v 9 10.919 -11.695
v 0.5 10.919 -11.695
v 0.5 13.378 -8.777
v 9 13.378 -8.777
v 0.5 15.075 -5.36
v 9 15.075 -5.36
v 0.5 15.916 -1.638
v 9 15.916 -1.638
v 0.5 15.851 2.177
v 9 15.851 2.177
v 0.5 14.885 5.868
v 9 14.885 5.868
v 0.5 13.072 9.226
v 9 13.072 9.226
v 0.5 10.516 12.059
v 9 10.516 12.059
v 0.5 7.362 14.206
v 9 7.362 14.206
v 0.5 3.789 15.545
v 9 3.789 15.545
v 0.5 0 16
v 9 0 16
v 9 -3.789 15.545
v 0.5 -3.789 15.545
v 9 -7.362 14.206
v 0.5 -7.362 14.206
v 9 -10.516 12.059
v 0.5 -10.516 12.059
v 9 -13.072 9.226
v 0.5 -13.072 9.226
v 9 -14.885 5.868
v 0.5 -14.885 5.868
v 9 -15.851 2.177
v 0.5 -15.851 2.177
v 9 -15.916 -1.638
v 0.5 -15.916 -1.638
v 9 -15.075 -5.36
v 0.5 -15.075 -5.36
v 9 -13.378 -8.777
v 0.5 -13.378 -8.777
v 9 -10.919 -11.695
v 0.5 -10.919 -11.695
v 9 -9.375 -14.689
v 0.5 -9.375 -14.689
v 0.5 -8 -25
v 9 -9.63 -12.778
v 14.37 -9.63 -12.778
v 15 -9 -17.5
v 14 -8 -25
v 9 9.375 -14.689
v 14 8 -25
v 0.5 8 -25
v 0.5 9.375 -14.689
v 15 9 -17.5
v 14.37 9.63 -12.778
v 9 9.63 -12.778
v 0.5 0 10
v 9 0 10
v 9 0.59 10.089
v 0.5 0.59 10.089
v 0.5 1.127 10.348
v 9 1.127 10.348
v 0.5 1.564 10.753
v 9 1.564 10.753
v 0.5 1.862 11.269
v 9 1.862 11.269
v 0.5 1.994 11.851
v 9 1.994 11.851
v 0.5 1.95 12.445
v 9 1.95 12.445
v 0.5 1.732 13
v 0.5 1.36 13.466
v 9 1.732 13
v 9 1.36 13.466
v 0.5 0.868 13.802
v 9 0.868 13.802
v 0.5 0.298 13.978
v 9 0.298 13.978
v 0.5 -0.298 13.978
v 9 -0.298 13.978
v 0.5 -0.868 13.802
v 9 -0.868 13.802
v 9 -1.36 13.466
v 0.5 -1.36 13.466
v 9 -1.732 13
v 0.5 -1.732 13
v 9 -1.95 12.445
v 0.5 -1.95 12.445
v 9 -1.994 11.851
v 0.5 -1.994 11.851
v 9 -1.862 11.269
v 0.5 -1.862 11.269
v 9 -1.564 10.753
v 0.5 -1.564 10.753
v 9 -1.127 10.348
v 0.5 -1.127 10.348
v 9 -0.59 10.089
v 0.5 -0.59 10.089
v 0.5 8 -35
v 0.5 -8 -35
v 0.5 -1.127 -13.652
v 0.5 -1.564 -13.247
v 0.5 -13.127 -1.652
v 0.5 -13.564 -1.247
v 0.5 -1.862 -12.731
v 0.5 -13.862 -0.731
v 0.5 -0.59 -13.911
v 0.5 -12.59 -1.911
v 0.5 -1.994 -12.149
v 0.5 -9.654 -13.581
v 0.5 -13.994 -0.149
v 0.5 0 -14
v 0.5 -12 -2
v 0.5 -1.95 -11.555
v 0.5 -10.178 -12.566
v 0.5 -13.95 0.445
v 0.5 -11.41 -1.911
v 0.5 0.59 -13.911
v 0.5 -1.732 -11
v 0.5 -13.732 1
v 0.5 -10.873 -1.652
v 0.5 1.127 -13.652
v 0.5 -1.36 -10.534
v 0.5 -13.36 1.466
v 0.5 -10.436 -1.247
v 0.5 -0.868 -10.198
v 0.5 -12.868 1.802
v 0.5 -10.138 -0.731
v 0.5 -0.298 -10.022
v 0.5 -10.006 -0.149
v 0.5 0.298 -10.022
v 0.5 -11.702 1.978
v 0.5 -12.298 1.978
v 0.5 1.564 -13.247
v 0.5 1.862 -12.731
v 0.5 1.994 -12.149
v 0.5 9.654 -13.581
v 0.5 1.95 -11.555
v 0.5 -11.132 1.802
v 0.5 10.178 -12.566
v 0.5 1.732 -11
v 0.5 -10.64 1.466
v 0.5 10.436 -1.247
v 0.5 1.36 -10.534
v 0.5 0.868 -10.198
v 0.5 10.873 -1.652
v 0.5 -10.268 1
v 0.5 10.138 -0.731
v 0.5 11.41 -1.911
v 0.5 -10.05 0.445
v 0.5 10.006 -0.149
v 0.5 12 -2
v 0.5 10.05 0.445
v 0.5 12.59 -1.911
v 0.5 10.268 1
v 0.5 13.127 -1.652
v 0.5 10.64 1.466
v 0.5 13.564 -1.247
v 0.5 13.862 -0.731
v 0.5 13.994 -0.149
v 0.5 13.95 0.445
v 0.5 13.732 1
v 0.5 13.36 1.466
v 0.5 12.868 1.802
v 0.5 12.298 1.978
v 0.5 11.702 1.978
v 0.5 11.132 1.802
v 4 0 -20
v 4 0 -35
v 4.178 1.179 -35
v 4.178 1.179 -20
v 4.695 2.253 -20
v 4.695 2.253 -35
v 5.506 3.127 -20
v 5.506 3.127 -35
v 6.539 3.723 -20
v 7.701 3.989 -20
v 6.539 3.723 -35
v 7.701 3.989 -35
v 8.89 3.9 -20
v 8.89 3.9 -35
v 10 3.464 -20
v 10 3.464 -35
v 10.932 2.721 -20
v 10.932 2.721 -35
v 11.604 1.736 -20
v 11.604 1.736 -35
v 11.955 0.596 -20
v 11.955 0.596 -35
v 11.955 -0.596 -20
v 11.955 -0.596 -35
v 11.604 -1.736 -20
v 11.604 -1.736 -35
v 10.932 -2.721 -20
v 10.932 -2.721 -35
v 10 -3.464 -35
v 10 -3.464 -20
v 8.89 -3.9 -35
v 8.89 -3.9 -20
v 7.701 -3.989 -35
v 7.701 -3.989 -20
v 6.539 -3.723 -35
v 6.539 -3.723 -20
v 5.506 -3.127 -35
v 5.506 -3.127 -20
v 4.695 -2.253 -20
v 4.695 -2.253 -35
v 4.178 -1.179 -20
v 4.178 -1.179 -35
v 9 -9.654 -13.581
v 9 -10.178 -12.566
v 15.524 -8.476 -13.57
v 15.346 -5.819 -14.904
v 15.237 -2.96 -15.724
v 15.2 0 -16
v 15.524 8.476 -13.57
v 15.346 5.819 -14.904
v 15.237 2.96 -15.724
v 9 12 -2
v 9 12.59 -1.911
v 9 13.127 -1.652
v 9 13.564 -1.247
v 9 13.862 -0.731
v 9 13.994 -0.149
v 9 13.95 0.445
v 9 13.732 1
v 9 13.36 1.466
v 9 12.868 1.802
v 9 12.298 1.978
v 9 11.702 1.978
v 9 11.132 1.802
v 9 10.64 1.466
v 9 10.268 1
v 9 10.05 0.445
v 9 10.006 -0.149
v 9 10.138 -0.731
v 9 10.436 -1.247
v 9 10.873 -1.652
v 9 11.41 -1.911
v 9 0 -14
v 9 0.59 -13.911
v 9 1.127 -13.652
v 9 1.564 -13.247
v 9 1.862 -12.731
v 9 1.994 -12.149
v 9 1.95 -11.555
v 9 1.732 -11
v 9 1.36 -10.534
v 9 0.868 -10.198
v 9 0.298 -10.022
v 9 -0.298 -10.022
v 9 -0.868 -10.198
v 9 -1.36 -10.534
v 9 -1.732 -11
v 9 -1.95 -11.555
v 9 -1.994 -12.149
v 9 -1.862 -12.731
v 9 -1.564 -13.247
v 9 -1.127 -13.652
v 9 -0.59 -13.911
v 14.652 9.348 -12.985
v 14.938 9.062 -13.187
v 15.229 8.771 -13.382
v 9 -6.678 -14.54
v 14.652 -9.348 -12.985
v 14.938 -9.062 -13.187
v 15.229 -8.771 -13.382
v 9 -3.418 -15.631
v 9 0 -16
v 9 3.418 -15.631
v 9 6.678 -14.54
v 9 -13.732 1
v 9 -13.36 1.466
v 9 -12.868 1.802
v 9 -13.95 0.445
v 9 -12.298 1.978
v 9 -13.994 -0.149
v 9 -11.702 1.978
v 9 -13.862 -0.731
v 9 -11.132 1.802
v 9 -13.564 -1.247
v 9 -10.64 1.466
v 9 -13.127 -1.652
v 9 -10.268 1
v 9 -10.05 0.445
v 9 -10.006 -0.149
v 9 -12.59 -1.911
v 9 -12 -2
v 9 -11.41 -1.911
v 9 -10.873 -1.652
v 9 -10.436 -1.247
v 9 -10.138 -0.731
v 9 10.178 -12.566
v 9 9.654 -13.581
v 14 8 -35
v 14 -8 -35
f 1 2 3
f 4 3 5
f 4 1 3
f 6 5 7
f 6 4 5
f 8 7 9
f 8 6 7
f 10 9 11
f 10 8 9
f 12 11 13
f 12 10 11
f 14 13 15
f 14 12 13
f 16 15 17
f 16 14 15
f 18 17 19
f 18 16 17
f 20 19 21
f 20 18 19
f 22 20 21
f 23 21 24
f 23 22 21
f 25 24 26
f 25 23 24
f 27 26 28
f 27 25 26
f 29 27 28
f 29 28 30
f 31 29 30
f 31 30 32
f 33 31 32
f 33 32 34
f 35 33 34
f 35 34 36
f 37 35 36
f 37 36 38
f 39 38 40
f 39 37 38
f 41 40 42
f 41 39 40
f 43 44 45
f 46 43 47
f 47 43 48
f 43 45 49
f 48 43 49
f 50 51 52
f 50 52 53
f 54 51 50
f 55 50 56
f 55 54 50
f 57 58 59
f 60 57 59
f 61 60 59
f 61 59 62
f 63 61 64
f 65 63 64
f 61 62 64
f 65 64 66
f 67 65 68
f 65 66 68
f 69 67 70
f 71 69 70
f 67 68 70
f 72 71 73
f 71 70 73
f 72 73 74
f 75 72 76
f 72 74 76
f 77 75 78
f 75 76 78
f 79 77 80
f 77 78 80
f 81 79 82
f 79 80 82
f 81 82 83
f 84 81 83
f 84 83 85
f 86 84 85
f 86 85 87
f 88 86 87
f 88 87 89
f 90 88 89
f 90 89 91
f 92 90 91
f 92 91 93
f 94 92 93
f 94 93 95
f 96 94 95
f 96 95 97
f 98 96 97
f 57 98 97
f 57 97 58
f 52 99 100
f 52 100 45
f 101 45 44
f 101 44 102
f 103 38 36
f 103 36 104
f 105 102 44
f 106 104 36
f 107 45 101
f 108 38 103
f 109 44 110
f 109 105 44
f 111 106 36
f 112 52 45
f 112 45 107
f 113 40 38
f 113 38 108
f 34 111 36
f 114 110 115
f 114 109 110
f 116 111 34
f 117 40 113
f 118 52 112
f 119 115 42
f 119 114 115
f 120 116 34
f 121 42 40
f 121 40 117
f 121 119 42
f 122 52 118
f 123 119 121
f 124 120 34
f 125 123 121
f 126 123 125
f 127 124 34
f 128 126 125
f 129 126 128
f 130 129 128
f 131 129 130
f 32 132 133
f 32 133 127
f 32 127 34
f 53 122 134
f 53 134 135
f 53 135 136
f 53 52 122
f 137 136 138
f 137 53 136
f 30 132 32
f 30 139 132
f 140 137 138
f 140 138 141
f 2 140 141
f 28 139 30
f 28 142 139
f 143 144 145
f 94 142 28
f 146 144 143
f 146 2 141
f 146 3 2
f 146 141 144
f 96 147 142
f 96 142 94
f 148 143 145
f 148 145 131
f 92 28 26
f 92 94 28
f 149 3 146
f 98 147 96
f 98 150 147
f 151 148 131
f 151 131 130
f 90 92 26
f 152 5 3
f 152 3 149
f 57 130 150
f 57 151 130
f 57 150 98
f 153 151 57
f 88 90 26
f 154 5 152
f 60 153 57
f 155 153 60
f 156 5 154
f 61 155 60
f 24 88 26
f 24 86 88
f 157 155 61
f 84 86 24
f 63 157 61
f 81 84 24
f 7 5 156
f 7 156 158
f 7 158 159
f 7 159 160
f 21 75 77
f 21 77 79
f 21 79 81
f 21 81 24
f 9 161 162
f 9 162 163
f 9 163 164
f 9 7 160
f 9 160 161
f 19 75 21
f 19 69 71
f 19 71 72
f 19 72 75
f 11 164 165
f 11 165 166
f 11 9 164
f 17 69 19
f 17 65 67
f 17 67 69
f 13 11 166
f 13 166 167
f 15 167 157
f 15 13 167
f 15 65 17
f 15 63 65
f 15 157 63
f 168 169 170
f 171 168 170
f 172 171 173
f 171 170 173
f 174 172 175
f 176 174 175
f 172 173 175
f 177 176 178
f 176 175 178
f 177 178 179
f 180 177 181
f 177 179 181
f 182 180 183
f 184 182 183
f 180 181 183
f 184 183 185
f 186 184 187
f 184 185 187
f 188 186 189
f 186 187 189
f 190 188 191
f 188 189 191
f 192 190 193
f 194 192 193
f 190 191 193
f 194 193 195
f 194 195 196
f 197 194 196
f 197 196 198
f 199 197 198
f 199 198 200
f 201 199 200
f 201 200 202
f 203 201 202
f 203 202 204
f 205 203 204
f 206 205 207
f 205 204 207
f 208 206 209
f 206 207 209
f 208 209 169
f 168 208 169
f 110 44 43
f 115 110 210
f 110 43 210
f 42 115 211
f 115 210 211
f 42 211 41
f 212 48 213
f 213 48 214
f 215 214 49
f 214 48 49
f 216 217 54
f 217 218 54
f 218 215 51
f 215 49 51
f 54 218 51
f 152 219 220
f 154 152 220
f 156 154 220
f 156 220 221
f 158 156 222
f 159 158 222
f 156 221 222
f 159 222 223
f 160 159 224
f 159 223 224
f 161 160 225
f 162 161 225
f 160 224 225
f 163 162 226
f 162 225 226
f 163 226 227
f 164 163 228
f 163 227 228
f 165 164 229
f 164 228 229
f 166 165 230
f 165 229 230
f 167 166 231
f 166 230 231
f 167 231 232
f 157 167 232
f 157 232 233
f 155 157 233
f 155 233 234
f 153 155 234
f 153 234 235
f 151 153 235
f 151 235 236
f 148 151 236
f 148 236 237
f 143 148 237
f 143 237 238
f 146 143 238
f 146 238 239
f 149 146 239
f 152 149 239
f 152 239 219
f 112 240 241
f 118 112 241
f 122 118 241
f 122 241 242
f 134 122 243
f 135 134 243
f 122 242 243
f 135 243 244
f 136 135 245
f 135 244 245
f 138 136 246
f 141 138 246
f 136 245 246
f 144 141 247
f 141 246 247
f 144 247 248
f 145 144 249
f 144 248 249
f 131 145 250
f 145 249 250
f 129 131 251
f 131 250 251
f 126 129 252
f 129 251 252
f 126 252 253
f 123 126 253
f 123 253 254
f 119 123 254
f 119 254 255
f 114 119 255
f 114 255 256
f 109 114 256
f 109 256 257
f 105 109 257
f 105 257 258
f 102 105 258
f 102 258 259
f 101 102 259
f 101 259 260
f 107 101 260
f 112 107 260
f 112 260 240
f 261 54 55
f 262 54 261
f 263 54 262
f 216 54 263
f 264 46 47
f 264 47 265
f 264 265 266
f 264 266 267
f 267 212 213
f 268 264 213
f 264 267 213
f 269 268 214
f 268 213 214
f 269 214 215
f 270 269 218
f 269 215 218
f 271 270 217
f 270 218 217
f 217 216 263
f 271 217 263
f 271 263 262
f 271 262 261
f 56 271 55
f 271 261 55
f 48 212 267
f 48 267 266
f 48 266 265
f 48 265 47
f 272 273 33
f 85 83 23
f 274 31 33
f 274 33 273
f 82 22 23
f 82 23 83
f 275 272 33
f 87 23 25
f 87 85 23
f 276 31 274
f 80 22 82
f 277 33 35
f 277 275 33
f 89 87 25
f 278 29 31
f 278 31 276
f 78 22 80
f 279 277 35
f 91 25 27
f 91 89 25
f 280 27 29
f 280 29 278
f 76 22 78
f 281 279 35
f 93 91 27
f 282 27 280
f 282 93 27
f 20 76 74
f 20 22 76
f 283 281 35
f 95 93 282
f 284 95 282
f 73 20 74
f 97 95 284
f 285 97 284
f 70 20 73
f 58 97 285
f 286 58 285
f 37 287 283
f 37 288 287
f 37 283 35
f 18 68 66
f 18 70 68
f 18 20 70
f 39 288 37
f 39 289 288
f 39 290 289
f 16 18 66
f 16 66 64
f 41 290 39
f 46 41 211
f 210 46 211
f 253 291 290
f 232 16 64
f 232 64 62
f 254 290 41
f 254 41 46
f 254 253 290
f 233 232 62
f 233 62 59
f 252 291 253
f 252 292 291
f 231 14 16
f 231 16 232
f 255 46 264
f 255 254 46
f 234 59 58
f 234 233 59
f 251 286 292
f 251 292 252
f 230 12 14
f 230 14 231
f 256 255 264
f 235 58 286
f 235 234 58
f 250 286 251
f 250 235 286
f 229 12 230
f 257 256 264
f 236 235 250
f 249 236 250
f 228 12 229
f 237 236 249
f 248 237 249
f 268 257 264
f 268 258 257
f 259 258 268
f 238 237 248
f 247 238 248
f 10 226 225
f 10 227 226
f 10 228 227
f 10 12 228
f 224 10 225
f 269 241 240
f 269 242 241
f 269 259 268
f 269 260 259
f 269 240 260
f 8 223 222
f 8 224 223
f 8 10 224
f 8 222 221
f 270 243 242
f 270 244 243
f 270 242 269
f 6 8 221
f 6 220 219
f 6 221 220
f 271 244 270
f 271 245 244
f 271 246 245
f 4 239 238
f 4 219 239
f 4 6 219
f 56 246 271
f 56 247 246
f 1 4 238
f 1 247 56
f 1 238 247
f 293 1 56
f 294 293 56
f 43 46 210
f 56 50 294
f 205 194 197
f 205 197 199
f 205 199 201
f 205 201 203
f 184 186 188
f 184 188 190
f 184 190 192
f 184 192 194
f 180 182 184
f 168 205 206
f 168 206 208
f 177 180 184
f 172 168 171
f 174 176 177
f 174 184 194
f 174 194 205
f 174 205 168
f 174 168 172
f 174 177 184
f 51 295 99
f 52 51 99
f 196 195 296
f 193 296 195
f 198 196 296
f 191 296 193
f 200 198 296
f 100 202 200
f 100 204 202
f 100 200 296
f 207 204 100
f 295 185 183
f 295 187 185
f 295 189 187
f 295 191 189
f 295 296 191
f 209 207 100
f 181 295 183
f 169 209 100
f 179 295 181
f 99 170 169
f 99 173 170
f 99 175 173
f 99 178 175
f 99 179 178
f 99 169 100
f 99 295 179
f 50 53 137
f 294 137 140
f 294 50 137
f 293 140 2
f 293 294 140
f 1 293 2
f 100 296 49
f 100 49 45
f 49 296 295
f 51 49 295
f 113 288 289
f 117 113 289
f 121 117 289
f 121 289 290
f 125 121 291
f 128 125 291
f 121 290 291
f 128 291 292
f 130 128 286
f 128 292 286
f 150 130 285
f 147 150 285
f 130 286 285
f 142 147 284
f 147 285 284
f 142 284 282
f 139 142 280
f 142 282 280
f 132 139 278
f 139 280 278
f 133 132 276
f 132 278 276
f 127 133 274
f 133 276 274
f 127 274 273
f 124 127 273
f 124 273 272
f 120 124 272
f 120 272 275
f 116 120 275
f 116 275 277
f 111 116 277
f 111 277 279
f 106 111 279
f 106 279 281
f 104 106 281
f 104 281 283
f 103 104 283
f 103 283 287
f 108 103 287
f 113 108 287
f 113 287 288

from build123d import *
from OCP.BRepFilletAPI import BRepFilletAPI_MakeChamfer

# Parameters (mm, degrees)
BOSS_EXTRUDE1_DEPTH = 16
CHAMFER1_SIZE       = 15
CHAMFER1_SIZE2      = 2
SKETCH2_R           = 3
CUT_EXTRUDE1_DEPTH  = 15
CHAMFER2_SIZE       = 2
THREAD1_PITCH       = 1.5
SKETCH5_R           = 7
BOSS_EXTRUDE2_DEPTH = 16
BOSS_EXTRUDE3_START = 10
SKETCH10_W          = 14
SKETCH10_H          = 16
SKETCH10_R          = 3
BOSS_EXTRUDE3_DEPTH = 10
BOSS_EXTRUDE4_START = 10
SKETCH11_R          = 3
BOSS_EXTRUDE4_DEPTH = 10
SKETCH12_R          = 16
CUT_EXTRUDE2_DEPTH  = 7
SKETCH13_R          = 16
BOSS_EXTRUDE5_DEPTH = 9
BOSS_EXTRUDE6_START = -9
BOSS_EXTRUDE6_DEPTH = 9
SKETCH15_R          = 2
CUT_EXTRUDE3_DEPTH  = 20
FILLET1_R           = 5
FILLET2_R           = 5
CUT_EXTRUDE4_START  = -0.5
CUT_EXTRUDE4_DEPTH  = 0.5
SKETCH17_R          = 4
CUT_EXTRUDE5_DEPTH  = 15


with BuildPart() as part:
    # Sketch1 → Boss-Extrude1 (new body)
    with BuildSketch(Plane(origin=(0, 0, 0), x_dir=(0, -1, 0), z_dir=(1, 0, 0))):
        with BuildLine():
            ThreePointArc((-10, 0), (0, 10), (10, 0))
            Line((10, 0), (10, 25))
            Line((10, 25), (-10, 25))
            Line((-10, 25), (-10, 0))
        make_face()
        with BuildLine():
            ThreePointArc((-4.5, 0), (0, 4.5), (4.5, 0))
            Line((4.5, 0), (10, 0))
            ThreePointArc((10, 0), (0, 10), (-10, 0))
            Line((-10, 0), (-4.5, 0))
        make_face()
        with BuildLine():
            Line((10, 0), (4.5, 0))
            ThreePointArc((4.5, 0), (0, -4.5), (-4.5, 0))
            Line((-4.5, 0), (-10, 0))
            ThreePointArc((-10, 0), (0, -10), (10, 0))
        make_face()
    extrude(amount=BOSS_EXTRUDE1_DEPTH)

    # Chamfer1: one chamfer whose edges measure the first distance from different faces: ONE call of the kernel's chamfer builder (chamfer() names one face for all edges)
    chamfer1_edges_1 = [part.edges().sort_by_distance(p)[0] for p in [
        (8, 10, -25),
    ]]
    chamfer1_side_1 = [part.faces().sort_by_distance(p)[0] for p in [
        (8, 10, -12.5),
    ]]
    chamfer1_edges_2 = [part.edges().sort_by_distance(p)[0] for p in [
        (8, -10, -25),
    ]]
    chamfer1_side_2 = [part.faces().sort_by_distance(p)[0] for p in [
        (8, -10, -12.5),
    ]]
    chamfer1_edges_3 = [part.edges().sort_by_distance(p)[0] for p in [
        (16, 0, -25),
    ]]
    chamfer1_side_3 = [part.faces().sort_by_distance(p)[0] for p in [
        (16, 0, -9.408066135),
    ]]
    chamfer1 = BRepFilletAPI_MakeChamfer(part.part.solid().wrapped)
    for e in chamfer1_edges_1:
        chamfer1.Add(CHAMFER1_SIZE, CHAMFER1_SIZE2, e.wrapped, chamfer1_side_1[0].wrapped)  # the first distance lies on this face
    for e in chamfer1_edges_2:
        chamfer1.Add(CHAMFER1_SIZE, CHAMFER1_SIZE2, e.wrapped, chamfer1_side_2[0].wrapped)  # the first distance lies on this face
    for e in chamfer1_edges_3:
        chamfer1.Add(CHAMFER1_SIZE, CHAMFER1_SIZE2, e.wrapped, chamfer1_side_3[0].wrapped)  # the first distance lies on this face
    add(Compound.cast(chamfer1.Shape()), mode=Mode.REPLACE)

    # Sketch2 → Cut-Extrude1 (cut)
    with BuildSketch(Plane(origin=(0, 0, -25), x_dir=(-1, 0, 0), z_dir=(0, 0, -1))):
        with Locations((-8, 0)):
            Circle(SKETCH2_R)
    extrude(amount=-CUT_EXTRUDE1_DEPTH, mode=Mode.SUBTRACT)

    # Chamfer2
    chamfer2_edges = [part.edges().sort_by_distance(p)[0] for p in [
        (0, 0, 10),
        (16, 0, 10),
        (16, 10, -5),
        (0, 10, -5),
        (0, -10, -5),
        (16, -10, -5),
    ]]
    chamfer(chamfer2_edges, length=CHAMFER2_SIZE)

    # Thread1: the profile of Thread Profile1 profile screwed along a right-hand helix of 11.333333 turns, 8 arcs to a turn; built about Z, then put on its axis
    thread1_z = Axis((0, 0, 0), (0, 0, 1))
    thread1_corners = [(4.4997, 0, -0.000173205), (5.311898812, 0, 0.468749998), (5.311898812, 0, 0.656249998), (4.4997, 0, 1.125173201)]
    with BuildLine(mode=Mode.PRIVATE) as thread1_profile:
        Line(thread1_corners[0], thread1_corners[1])
        Line(thread1_corners[1], thread1_corners[2])
        Line(thread1_corners[2], thread1_corners[3])
        Line(thread1_corners[3], thread1_corners[0])
    thread1_cap = Face(thread1_profile.wire())
    thread1_turn_angles = [0, 22.5, 45, 67.5, 90, 112.5, 135, 157.5, 180, 202.5, 225, 247.5, 270, 292.5, 315, 337.5, 360]
    thread1_turn_weights = [1, 0.9238795325112867, 1, 0.9238795325112867, 1, 0.9238795325112867, 1, 0.9238795325112867, 1, 0.9238795325112867, 1, 0.9238795325112867, 1, 0.9238795325112867, 1, 0.9238795325112867, 1]
    thread1_turn_rails = [Edge.make_bspline([Vector(p[0], p[1], 0).rotate(thread1_z, thread1_turn_angles[k]) / thread1_turn_weights[k] + Vector(0, 0, p[2] + THREAD1_PITCH * thread1_turn_angles[k] / 360) for k in range(17)], [0, 0, 0, 1, 1, 2, 2, 3, 3, 4, 4, 5, 5, 6, 6, 7, 7, 8, 8, 8], 2, thread1_turn_weights) for p in thread1_corners]
    thread1_turn_sides = [Face.make_surface_from_curves(thread1_turn_rails[p[0]], thread1_turn_rails[p[1]]) for p in [(0, 1), (1, 2), (2, 3), (3, 0)]]
    thread1_last_angles = [3960, 3982.5, 4005, 4027.5, 4050, 4065, 4080]
    thread1_last_weights = [1, 0.9238795325112867, 1, 0.9238795325112867, 1, 0.9659258262890693, 1]
    thread1_last_rails = [Edge.make_bspline([Vector(p[0], p[1], 0).rotate(thread1_z, thread1_last_angles[k]) / thread1_last_weights[k] + Vector(0, 0, p[2] + THREAD1_PITCH * thread1_last_angles[k] / 360) for k in range(7)], [0, 0, 0, 1, 1, 2, 2, 3, 3, 3], 2, thread1_last_weights) for p in thread1_corners]
    thread1_last_sides = [Face.make_surface_from_curves(thread1_last_rails[p[0]], thread1_last_rails[p[1]]) for p in [(0, 1), (1, 2), (2, 3), (3, 0)]]
    thread1 = Plane(origin=(-1, 0, 0), x_dir=(0, 0, -1), z_dir=(1, 0, 0)) * Solid(Shell([*[p.moved(Location((0, 0, THREAD1_PITCH * i))) for i in range(11) for p in thread1_turn_sides], *thread1_last_sides, thread1_cap, thread1_cap.rotate(thread1_z, 4080).moved(Location((0, 0, THREAD1_PITCH * 4080 / 360)))]))
    add(thread1, mode=Mode.SUBTRACT)

    # Sketch5 → Boss-Extrude2 (add)
    with BuildSketch(Plane.ZY):
        Circle(SKETCH5_R)
    extrude(amount=-BOSS_EXTRUDE2_DEPTH)

    # Sketch10 → Boss-Extrude3 (add)
    with BuildSketch(Plane(origin=(0, 0, -25), x_dir=(-1, 0, 0), z_dir=(0, 0, -1)).offset(BOSS_EXTRUDE3_START)):
        with Locations((-7, 0)):
            Rectangle(SKETCH10_W, SKETCH10_H)
        with Locations((-8, 0)):
            Circle(SKETCH10_R, mode=Mode.SUBTRACT)
    extrude(amount=-BOSS_EXTRUDE3_DEPTH)

    # Sketch11 → Boss-Extrude4 (add)
    with BuildSketch(Plane(origin=(0, 0, -10), x_dir=(-1, 0, 0), z_dir=(0, 0, -1)).offset(BOSS_EXTRUDE4_START)):
        with Locations((-8, 0)):
            Circle(SKETCH11_R)
    extrude(amount=-BOSS_EXTRUDE4_DEPTH)

    # Sketch12 → Cut-Extrude2 (cut)
    with BuildSketch(Plane(origin=(16, 0, 0), x_dir=(0, 0, -1), z_dir=(1, 0, 0))):
        Circle(SKETCH12_R)
    extrude(amount=-CUT_EXTRUDE2_DEPTH, mode=Mode.SUBTRACT)

    # Sketch13 → Boss-Extrude5 (add)
    with BuildSketch(Plane(origin=(9, 0, 0), x_dir=(0, 0, -1), z_dir=(1, 0, 0))):
        Circle(SKETCH13_R)
    extrude(amount=-BOSS_EXTRUDE5_DEPTH)

    # Sketch14 → Boss-Extrude6 (add)
    with BuildSketch(Plane.ZY.offset(BOSS_EXTRUDE6_START)):
        with BuildLine():
            Line((-25, -8), (-13.856406461, -8))
            ThreePointArc((-13.856406461, -8), (-13.341966778, -8.831303556), (-12.777718105, -9.629637586))
            Line((-12.777718105, -9.629637586), (-25, -8))
        make_face()
        with BuildLine():
            Line((-13.856406461, 8), (-25, 8))
            Line((-25, 8), (-12.777718105, 9.629637586))
            ThreePointArc((-12.777718105, 9.629637586), (-13.341966778, 8.831303556), (-13.856406461, 8))
        make_face()
    extrude(amount=BOSS_EXTRUDE6_DEPTH)

    # Sketch15 → Cut-Extrude3 (cut)
    with BuildSketch(Plane(origin=(9, 0, 0), x_dir=(0, 0, -1), z_dir=(1, 0, 0))):
        with Locations((12, 0)):
            Circle(SKETCH15_R)
        with Locations((0, 12)):
            Circle(SKETCH15_R)
        with Locations((-12, 0)):
            Circle(SKETCH15_R)
        with Locations((0, -12)):
            Circle(SKETCH15_R)
    extrude(amount=-CUT_EXTRUDE3_DEPTH, mode=Mode.SUBTRACT)

    # Fillet1
    fillet1_edges = [part.edges().sort_by_distance(p)[0] for p in [
        (4.5, -9.629637586, -12.777718105),
    ]]
    fillet(fillet1_edges, radius=FILLET1_R)

    # Fillet2
    fillet2_edges = [part.edges().sort_by_distance(p)[0] for p in [
        (4.5, 9.629637586, -12.777718105),
    ]]
    fillet(fillet2_edges, radius=FILLET2_R)

    # Sketch16 → Cut-Extrude4 (cut)
    with BuildSketch(Plane.ZY.offset(CUT_EXTRUDE4_START)):
        with BuildLine():
            Line((-14.689269432, 9.374764076), (-25, 8))
            Line((-25, 8), (-35, 8))
            Line((-35, 8), (-35, -8))
            Line((-35, -8), (-25, -8))
            Line((-25, -8), (-14.689269432, -9.374764076))
            ThreePointArc((-14.689269432, -9.374764076), (-13.058341289, -9.887042998), (-11.695305168, -10.918783679))
            ThreePointArc((-11.695305168, -10.918783679), (16, 0), (-11.695305168, 10.918783679))
            ThreePointArc((-11.695305168, 10.918783679), (-13.058341289, 9.887042998), (-14.689269432, 9.374764076))
        make_face()
    extrude(amount=CUT_EXTRUDE4_DEPTH, mode=Mode.SUBTRACT)

    # Sketch17 → Cut-Extrude5 (cut)
    with BuildSketch(Plane(origin=(0, 0, -35), x_dir=(-1, 0, 0), z_dir=(0, 0, -1))):
        with Locations((-8, 0)):
            Circle(SKETCH17_R)
    extrude(amount=-CUT_EXTRUDE5_DEPTH, mode=Mode.SUBTRACT)


solid = part.part
